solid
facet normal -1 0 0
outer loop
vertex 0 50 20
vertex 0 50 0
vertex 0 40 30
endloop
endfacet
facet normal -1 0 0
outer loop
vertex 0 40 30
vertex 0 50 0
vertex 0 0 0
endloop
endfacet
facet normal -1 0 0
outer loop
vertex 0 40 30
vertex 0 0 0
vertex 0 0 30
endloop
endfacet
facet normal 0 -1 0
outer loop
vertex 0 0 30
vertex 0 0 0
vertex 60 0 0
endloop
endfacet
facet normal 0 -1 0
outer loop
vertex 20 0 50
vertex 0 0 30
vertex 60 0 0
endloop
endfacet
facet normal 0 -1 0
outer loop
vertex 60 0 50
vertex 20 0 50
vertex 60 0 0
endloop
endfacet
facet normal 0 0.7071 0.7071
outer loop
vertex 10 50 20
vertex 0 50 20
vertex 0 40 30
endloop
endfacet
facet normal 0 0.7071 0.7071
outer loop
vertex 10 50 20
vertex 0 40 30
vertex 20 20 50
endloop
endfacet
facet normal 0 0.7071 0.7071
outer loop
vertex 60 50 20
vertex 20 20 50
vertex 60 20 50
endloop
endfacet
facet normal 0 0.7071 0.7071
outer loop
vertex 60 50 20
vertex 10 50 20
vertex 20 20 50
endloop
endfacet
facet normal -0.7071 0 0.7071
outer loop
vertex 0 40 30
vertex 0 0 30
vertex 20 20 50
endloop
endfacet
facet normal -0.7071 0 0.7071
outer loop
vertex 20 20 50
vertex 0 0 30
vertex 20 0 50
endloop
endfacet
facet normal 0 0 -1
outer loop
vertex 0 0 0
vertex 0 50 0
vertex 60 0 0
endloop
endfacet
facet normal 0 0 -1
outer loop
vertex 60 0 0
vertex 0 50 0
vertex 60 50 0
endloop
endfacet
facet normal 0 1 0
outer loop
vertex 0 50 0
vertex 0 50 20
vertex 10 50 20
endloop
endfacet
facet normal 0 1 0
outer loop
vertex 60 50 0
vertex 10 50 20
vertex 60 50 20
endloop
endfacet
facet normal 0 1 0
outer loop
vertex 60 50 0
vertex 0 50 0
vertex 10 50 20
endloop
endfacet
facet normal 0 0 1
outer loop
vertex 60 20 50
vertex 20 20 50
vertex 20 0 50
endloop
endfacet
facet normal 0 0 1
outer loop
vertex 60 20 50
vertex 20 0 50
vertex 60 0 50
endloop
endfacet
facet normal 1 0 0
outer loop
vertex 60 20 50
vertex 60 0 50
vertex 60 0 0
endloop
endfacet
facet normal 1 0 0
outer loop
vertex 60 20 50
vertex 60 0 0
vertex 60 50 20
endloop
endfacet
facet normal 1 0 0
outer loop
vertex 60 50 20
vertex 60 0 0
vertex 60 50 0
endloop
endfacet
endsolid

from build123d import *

# Parameters (mm, degrees)
SKETCH1_W           = 60
SKETCH1_H           = 50
BOSS_EXTRUDE1_DEPTH = 50
CUT_EXTRUDE1_DEPTH  = 50
SKETCH3_W           = 60
SKETCH3_H           = 30
CUT_EXTRUDE2_DEPTH  = 30
BOSS_EXTRUDE2_DEPTH = 30
SKETCH9_W           = 60
SKETCH9_H           = 50
CUT_EXTRUDE3_DEPTH  = 10
SKETCH10_W          = 60
SKETCH10_H          = 30
CUT_EXTRUDE4_DEPTH  = 10
BOSS_EXTRUDE7_DEPTH = 30
CUT_EXTRUDE10_DEPTH = 30
SKETCH20_W          = 60
SKETCH20_H          = 42.426406872
CUT_EXTRUDE11_DEPTH = 30


with BuildPart() as part:
    # Sketch1 → Boss-Extrude1 (new body)
    with BuildSketch(Plane.XY):
        with Locations((30, 25)):
            Rectangle(SKETCH1_W, SKETCH1_H)
    extrude(amount=BOSS_EXTRUDE1_DEPTH)

    # Sketch2 → Cut-Extrude1 (cut)
    with BuildSketch(Plane.XZ):
        Polygon((0, 30), (20, 50), (0, 50), align=None)
    extrude(amount=-CUT_EXTRUDE1_DEPTH, mode=Mode.SUBTRACT)

    # Sketch3 → Cut-Extrude2 (cut)
    with BuildSketch(Plane.XY.offset(50)):
        with Locations((30, 35)):
            Rectangle(SKETCH3_W, SKETCH3_H)
    extrude(amount=-CUT_EXTRUDE2_DEPTH, mode=Mode.SUBTRACT)

    # Sketch4 → Boss-Extrude2 (add)
    with BuildSketch(Plane(origin=(0, 35, 35), x_dir=(1, 0, 0), z_dir=(0, 0.707106781, 0.707106781))):
        Polygon((60, -21.213203436), (60, 21.213203436), (0, 21.213203436), (20, -21.213203436), align=None)
    extrude(amount=-BOSS_EXTRUDE2_DEPTH)

    # Sketch9 → Cut-Extrude3 (cut)
    with BuildSketch(Plane(origin=(0, 0, 0), x_dir=(-1, 0, 0), z_dir=(0, 0, -1))):
        with Locations((-30, 25)):
            Rectangle(SKETCH9_W, SKETCH9_H)
    extrude(amount=CUT_EXTRUDE3_DEPTH, mode=Mode.SUBTRACT)

    # Sketch10 → Cut-Extrude4 (cut)
    with BuildSketch(Plane.XZ):
        with Locations((30, 15)):
            Rectangle(SKETCH10_W, SKETCH10_H)
    extrude(amount=CUT_EXTRUDE4_DEPTH, mode=Mode.SUBTRACT)

    # Sketch18 → Boss-Extrude7 (add)
    with BuildSketch(Plane(origin=(0, 20, 0), x_dir=(1, 0, 0), z_dir=(0, 1, 0))):
        Polygon((10, -20), (0, -20), (0, -30), (20, -50), align=None)
    extrude(amount=BOSS_EXTRUDE7_DEPTH)

    # Sketch19 → Cut-Extrude10 (cut)
    with BuildSketch(Plane(origin=(3, 0, -1), x_dir=(-0.316227766, 0, -0.948683298), z_dir=(0.948683298, 0, -0.316227766))):
        Polygon((-22.135943621, 50), (-53.758720223, 20), (-53.758720223, 50), align=None)
    extrude(amount=-CUT_EXTRUDE10_DEPTH, mode=Mode.SUBTRACT)

    # Sketch20 → Cut-Extrude11 (cut)
    with BuildSketch(Plane(origin=(0, 35, 35), x_dir=(1, 0, 0), z_dir=(0, 0.707106781, 0.707106781))):
        with Locations((30, 0)):
            Rectangle(SKETCH20_W, SKETCH20_H)
    extrude(amount=CUT_EXTRUDE11_DEPTH, mode=Mode.SUBTRACT)


solid = part.part
